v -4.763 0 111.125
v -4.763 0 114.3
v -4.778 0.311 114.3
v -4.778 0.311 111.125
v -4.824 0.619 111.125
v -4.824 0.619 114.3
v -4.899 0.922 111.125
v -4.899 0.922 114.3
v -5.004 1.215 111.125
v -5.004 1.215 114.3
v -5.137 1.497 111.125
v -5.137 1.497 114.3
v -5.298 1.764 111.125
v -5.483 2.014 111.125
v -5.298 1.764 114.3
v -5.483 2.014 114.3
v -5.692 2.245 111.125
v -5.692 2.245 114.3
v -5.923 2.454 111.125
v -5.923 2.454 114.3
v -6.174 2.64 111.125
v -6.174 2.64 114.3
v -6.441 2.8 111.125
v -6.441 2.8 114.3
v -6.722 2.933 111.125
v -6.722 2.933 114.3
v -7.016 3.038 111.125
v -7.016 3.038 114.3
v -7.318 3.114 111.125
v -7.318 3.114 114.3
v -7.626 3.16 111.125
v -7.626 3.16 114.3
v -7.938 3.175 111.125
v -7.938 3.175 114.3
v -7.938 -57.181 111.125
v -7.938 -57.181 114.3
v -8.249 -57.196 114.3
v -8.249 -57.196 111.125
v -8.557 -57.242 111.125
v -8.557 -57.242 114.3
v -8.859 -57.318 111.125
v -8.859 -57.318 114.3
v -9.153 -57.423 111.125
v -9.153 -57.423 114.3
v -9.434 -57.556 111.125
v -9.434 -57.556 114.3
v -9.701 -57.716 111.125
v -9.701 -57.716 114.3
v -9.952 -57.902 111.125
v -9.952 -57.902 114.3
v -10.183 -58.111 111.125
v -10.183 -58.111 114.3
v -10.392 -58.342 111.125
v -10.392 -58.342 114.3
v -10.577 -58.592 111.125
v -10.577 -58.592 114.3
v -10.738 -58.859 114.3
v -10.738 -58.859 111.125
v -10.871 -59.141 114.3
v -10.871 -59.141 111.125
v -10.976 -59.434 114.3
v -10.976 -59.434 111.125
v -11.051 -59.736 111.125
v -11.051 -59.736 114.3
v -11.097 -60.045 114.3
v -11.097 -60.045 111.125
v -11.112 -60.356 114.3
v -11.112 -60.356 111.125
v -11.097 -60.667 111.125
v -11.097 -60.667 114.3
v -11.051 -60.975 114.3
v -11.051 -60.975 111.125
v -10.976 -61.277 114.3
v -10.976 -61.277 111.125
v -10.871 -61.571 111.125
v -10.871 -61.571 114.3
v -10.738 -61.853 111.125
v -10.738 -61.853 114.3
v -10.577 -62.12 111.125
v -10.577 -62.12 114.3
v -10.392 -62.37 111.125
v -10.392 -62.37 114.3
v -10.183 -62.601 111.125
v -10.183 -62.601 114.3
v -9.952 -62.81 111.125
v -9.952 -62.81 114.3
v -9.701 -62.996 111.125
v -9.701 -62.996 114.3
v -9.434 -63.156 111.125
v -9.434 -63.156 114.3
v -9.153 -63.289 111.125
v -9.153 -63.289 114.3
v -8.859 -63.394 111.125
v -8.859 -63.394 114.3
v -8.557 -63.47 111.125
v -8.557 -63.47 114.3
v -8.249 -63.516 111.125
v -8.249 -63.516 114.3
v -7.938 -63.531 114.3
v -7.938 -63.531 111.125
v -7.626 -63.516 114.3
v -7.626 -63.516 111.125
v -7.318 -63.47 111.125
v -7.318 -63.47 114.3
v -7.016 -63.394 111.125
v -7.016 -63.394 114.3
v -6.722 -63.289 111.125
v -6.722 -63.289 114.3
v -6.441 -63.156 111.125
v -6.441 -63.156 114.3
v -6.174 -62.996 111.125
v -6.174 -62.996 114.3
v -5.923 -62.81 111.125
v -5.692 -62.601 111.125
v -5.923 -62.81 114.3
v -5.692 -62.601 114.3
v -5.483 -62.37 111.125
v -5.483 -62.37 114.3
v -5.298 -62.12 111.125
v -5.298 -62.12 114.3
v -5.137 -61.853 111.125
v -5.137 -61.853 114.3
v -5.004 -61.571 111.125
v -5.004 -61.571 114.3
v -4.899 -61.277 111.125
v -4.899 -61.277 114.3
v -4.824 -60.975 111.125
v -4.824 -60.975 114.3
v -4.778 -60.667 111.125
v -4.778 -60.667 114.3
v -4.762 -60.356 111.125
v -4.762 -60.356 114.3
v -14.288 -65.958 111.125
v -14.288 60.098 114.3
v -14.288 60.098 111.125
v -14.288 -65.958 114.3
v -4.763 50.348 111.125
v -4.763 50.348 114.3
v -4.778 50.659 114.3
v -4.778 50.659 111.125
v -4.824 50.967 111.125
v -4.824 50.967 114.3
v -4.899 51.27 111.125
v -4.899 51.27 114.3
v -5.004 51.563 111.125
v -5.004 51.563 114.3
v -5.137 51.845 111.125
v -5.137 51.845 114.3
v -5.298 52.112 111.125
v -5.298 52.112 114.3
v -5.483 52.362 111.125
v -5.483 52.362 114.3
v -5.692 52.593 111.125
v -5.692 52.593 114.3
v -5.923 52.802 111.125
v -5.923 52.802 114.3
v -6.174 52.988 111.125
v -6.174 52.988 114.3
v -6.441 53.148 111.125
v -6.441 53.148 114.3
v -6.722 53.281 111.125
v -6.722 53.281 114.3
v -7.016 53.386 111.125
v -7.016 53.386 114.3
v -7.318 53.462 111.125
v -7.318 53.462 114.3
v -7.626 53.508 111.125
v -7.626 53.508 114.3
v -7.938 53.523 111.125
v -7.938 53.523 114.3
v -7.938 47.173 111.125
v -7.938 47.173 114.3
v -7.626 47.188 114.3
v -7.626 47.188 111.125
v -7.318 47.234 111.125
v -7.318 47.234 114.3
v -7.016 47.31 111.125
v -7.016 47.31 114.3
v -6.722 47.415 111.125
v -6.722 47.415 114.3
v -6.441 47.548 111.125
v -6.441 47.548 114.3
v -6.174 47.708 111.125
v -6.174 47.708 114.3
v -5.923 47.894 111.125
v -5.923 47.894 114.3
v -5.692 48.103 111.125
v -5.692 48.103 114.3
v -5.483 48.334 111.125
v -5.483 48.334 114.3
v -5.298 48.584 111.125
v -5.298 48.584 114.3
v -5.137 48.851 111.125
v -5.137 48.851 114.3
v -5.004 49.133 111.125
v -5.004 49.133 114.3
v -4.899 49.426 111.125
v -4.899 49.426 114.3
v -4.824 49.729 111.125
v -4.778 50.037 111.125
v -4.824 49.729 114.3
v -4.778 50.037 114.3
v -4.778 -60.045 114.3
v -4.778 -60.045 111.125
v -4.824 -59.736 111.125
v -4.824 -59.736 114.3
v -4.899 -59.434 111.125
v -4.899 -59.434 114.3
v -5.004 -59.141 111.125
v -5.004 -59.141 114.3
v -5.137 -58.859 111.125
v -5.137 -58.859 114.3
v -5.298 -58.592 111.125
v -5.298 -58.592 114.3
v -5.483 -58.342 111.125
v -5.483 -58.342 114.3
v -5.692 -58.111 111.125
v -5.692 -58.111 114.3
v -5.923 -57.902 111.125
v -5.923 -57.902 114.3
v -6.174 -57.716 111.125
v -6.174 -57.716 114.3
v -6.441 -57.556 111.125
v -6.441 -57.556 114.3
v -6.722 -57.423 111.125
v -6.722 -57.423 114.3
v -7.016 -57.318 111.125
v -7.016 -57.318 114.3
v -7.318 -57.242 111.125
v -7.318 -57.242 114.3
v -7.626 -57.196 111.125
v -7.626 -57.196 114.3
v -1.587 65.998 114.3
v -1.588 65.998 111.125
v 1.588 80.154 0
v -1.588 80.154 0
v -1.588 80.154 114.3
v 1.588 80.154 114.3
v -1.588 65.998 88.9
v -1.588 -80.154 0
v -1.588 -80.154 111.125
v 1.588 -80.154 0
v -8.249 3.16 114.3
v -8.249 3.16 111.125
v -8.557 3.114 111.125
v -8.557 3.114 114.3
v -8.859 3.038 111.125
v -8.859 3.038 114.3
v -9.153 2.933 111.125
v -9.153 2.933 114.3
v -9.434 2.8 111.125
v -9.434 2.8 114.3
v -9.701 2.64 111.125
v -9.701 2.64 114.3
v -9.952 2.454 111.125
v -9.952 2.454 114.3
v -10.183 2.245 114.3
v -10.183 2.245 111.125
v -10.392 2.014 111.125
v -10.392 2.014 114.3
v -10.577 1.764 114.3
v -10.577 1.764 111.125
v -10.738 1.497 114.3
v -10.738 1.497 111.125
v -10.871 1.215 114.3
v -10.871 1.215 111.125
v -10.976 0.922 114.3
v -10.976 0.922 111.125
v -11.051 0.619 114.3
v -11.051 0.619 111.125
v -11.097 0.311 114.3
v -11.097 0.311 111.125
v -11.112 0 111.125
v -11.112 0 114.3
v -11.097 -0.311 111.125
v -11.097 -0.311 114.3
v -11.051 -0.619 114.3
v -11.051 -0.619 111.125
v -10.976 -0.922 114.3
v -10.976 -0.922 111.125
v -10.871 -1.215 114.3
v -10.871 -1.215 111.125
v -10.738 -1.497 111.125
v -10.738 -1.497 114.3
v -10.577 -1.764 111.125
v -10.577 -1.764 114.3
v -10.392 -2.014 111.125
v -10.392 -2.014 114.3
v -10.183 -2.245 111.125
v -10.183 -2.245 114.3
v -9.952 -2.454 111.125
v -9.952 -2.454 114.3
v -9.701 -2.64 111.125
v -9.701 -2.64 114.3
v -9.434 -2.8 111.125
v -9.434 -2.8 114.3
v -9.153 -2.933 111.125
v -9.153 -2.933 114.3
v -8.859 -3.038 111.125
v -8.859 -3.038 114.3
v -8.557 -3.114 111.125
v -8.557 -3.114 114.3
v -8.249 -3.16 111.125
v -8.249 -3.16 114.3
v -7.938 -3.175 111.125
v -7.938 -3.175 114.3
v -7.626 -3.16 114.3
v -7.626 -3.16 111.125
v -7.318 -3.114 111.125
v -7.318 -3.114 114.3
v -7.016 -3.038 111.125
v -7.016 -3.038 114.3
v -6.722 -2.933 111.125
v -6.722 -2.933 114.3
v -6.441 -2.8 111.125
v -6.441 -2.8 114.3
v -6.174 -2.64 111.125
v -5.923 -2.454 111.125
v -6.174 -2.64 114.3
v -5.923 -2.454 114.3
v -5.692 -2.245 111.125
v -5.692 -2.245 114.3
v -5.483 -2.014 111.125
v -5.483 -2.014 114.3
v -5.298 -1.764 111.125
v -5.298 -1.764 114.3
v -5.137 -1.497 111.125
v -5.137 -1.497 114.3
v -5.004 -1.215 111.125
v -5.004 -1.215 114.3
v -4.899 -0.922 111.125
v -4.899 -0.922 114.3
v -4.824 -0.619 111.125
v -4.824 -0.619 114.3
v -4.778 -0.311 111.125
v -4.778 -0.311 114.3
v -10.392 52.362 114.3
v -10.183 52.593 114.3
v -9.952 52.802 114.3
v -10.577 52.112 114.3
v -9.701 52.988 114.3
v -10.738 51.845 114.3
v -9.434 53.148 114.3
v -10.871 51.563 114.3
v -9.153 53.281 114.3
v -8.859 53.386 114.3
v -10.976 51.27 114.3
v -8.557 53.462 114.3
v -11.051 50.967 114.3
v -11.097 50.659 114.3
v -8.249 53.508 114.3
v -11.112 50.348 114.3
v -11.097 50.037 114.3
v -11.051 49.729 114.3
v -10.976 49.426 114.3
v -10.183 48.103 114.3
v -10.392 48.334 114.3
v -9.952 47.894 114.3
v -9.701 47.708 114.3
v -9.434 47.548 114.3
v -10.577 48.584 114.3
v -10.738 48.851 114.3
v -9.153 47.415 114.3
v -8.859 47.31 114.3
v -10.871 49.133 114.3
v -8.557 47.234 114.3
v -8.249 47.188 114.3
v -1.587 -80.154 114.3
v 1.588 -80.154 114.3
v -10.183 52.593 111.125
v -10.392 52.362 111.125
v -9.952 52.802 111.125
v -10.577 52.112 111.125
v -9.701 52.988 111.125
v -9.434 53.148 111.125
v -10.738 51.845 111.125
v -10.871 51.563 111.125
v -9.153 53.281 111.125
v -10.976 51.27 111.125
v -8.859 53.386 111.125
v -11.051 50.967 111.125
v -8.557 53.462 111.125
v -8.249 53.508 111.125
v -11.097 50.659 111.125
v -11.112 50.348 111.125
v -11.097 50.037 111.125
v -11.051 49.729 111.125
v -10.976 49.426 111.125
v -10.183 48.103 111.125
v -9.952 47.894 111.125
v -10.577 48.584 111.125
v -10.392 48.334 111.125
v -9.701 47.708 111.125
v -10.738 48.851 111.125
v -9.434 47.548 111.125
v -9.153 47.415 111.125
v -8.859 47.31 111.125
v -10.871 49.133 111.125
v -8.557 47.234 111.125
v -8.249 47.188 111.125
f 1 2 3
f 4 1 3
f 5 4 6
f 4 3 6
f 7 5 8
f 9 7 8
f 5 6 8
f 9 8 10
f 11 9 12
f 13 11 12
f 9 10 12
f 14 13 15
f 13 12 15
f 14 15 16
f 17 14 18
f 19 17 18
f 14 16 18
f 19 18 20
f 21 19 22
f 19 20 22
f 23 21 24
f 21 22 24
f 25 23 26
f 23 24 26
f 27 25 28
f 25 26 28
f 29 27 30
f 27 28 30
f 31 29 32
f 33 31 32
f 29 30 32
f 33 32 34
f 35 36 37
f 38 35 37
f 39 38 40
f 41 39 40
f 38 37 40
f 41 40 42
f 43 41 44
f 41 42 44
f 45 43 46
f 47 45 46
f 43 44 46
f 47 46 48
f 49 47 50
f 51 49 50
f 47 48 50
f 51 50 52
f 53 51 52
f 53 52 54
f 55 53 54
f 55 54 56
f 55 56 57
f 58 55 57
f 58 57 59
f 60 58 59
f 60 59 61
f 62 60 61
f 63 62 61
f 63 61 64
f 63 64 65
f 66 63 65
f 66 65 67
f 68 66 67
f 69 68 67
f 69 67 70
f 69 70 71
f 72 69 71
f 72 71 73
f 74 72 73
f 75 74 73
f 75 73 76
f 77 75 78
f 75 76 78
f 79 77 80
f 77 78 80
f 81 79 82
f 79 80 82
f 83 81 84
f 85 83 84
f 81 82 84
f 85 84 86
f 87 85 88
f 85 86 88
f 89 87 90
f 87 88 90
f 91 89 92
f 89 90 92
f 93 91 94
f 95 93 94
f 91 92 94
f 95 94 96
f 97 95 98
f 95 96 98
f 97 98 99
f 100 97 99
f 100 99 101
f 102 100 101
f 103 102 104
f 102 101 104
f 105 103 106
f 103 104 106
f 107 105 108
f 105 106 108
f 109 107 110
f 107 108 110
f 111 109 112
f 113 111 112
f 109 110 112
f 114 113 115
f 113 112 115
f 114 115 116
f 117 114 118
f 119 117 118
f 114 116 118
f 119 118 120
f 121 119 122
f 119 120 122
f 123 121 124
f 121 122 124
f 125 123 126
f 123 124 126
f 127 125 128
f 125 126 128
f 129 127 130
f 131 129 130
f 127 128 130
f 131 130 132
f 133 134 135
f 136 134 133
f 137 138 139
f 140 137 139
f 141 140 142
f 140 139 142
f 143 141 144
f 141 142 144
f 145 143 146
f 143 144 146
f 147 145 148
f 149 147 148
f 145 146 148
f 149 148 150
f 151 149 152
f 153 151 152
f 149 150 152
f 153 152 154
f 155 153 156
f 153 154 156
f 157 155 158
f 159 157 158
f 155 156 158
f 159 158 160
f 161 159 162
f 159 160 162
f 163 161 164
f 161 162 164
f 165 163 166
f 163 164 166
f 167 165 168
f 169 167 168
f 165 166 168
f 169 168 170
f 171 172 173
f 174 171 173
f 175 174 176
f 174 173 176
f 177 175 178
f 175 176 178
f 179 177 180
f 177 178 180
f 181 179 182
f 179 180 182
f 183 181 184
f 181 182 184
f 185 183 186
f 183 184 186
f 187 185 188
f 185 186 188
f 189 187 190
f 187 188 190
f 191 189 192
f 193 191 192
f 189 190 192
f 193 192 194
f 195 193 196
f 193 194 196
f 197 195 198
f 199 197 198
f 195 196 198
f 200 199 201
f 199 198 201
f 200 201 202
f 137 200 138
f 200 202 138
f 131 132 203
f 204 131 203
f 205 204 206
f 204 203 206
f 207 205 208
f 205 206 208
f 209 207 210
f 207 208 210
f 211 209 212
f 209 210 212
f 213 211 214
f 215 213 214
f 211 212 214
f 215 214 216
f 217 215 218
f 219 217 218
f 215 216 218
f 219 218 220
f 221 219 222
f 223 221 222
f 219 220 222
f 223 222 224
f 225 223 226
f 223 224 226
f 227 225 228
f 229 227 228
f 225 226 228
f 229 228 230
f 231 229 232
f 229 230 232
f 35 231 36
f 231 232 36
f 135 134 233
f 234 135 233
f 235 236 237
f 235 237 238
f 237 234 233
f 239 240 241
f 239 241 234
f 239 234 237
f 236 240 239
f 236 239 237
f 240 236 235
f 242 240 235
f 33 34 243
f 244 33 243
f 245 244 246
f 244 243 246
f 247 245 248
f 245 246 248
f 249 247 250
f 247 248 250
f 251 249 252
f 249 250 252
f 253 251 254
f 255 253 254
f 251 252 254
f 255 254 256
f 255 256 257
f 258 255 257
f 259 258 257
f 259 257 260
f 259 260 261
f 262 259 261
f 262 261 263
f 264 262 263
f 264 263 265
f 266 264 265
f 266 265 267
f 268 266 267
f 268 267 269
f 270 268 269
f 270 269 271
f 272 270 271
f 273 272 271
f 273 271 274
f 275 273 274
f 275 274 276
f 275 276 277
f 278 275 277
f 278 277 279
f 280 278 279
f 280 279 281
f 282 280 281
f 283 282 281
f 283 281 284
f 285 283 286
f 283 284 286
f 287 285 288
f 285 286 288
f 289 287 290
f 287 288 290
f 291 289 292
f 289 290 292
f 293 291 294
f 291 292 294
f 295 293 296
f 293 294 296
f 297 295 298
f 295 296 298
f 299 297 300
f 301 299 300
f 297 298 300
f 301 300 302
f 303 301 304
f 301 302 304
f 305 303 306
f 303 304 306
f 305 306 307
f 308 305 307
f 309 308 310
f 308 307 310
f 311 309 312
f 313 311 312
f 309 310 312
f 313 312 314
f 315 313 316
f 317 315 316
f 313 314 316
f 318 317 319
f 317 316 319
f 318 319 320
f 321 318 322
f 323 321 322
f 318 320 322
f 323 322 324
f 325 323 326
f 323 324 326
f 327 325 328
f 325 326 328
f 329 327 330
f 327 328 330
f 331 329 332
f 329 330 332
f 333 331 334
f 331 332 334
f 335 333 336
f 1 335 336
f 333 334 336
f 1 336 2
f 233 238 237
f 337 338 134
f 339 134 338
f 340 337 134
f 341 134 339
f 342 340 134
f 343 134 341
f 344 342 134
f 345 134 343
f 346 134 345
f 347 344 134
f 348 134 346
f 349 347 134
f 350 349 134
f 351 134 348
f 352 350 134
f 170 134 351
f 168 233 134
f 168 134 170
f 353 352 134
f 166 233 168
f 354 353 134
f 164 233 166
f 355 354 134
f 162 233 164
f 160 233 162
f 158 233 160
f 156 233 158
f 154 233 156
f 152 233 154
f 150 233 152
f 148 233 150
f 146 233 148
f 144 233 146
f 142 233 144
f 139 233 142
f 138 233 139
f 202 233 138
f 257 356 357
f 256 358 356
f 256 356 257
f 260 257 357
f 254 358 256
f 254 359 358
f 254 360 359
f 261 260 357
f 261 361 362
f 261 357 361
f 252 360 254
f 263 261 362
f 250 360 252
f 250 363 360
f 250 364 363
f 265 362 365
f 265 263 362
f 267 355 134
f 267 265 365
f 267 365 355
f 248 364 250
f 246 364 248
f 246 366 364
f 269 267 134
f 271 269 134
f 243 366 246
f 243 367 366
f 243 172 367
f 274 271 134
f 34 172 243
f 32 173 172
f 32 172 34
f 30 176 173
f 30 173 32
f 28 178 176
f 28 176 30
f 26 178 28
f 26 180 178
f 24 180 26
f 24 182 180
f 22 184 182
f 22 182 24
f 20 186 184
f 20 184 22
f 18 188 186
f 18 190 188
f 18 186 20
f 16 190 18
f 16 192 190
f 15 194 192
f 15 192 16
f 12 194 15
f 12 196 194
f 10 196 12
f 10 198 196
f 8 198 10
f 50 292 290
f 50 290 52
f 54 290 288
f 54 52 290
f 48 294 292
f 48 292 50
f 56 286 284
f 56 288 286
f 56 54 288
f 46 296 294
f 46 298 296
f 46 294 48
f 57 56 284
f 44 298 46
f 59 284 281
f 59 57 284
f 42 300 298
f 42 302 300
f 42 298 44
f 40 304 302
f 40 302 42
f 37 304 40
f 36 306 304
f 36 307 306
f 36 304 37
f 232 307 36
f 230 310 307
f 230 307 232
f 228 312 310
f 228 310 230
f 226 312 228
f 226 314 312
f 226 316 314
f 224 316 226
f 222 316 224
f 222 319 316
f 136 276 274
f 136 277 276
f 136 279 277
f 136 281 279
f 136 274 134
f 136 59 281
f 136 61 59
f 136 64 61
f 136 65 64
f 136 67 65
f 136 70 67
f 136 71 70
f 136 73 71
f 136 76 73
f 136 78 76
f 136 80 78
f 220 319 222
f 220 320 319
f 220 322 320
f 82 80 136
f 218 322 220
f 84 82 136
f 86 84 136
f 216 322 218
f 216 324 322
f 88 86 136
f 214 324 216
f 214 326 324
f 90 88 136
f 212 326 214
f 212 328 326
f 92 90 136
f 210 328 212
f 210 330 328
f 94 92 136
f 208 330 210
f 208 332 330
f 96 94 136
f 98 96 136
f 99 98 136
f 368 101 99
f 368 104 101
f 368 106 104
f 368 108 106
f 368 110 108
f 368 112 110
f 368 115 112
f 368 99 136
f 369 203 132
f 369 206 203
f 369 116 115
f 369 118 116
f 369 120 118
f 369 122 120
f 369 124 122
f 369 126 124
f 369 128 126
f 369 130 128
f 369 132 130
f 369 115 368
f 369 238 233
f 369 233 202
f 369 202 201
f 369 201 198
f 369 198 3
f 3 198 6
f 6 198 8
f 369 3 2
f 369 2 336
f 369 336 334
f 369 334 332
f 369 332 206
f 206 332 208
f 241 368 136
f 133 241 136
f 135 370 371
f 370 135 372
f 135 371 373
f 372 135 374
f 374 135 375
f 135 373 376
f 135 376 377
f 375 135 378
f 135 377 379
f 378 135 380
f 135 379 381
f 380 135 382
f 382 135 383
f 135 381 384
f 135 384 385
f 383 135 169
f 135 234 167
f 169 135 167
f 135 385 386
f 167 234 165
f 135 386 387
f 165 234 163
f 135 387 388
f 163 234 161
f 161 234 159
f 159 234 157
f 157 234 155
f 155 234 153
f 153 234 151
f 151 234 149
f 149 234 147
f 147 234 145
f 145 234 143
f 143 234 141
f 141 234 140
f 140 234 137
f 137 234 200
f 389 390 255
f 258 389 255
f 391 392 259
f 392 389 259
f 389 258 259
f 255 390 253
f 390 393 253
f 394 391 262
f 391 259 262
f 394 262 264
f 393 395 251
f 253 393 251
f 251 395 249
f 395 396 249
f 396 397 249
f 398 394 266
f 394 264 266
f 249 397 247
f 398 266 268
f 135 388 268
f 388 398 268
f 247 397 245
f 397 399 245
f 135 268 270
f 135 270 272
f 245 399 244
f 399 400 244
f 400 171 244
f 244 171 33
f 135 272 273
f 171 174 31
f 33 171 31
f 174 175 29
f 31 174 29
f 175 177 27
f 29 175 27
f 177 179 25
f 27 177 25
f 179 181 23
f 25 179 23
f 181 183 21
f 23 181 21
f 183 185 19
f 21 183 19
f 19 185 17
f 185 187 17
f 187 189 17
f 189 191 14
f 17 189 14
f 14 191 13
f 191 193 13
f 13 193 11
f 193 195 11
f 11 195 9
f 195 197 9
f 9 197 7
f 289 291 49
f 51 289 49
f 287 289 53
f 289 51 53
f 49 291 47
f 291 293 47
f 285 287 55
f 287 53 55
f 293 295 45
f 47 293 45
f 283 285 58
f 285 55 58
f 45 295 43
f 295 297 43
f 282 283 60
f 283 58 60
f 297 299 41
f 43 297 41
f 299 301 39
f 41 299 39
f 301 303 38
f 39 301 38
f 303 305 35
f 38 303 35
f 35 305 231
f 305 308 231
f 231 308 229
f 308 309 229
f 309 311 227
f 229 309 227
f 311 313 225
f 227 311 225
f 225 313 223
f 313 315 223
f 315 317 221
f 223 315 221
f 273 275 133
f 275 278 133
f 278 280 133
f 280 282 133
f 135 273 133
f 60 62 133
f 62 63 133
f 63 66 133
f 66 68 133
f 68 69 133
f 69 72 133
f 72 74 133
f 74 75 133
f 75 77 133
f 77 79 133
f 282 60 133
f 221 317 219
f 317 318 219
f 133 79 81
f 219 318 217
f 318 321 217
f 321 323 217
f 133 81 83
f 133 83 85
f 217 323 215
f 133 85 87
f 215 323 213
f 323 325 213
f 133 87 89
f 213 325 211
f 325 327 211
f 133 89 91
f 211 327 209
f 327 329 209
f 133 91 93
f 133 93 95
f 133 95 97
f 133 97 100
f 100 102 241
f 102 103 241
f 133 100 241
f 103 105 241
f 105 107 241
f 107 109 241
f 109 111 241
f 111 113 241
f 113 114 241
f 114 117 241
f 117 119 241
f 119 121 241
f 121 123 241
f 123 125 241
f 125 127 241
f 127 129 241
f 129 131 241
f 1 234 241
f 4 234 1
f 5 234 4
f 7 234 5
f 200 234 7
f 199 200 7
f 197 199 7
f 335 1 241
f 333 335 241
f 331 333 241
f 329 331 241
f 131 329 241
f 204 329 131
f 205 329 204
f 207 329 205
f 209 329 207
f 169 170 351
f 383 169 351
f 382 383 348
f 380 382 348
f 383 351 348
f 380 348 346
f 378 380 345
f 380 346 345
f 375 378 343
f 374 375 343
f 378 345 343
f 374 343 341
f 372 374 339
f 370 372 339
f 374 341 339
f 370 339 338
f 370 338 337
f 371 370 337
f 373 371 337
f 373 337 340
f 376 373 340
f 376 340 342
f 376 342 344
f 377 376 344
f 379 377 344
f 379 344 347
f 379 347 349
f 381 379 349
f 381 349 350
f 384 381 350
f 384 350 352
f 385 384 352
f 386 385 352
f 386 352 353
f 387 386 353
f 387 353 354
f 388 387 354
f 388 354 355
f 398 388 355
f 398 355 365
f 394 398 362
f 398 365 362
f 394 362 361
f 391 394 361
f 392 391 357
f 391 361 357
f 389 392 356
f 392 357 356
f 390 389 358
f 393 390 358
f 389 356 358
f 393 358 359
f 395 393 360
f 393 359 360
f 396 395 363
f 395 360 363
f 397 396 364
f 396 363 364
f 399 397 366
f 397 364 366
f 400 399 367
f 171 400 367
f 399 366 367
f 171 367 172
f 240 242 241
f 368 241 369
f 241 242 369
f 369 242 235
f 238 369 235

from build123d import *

# Parameters (mm, degrees)
F0_W     = 3.175
F0_H     = 160.30702
F1_DEPTH = 114.3
F2_W     = 146.1514011281
F2_H     = 3.175
F3_DEPTH = 12.7
F5_DEPTH = 25.4
F7_DEPTH = 25.4


with BuildPart() as f1:
    # F0 (on Top) → F1 (new body)
    with BuildSketch(Plane.XY):
        Rectangle(F0_W, F0_H)
    extrude(amount=F1_DEPTH)

    # F2 (on face) → F3 (join)
    with BuildSketch(Plane(origin=(-1.5875, 0, 0), x_dir=(0, -1, 0), z_dir=(-1, 0, 0))):
        with Locations((7.077809436, 112.7125)):
            Rectangle(F2_W, F2_H)
    extrude(amount=F3_DEPTH)

    # F4 (on face) → F5 (cut)
    with BuildSketch(Plane.XY.offset(114.3)):
        Polygon((-14.2875, 60.0979924202), (-1.5875, 65.9978911281), (-14.2875, 65.9978911281), align=None)
        Polygon((-14.2875, -80.15351), (-1.5875, -80.15351), (-14.2875, -65.9581273794), align=None)
    extrude(amount=-F5_DEPTH, mode=Mode.SUBTRACT)

    # F6 (on face) → F7 (cut)
    with BuildSketch(Plane.XY.offset(114.3)):
        with BuildLine():
            ThreePointArc((-4.7625, 50.3479417741), (-5.6924359697, 52.5930058044), (-7.9375, 53.5229417741))
            Line((-7.9375, 53.5229417741), (-7.9375, 47.1729417741))
            ThreePointArc((-7.9375, 47.1729417741), (-5.6924359697, 48.1028777439), (-4.7625, 50.3479417741))
        make_face()
        with BuildLine():
            ThreePointArc((-4.7625, -60.3558186897), (-5.6924359697, -58.1107546594), (-7.9375, -57.1808186897))
            Line((-7.9375, -57.1808186897), (-7.9375, -63.5308186897))
            ThreePointArc((-7.9375, -63.5308186897), (-5.6924359697, -62.60088272), (-4.7625, -60.3558186897))
        make_face()
        with BuildLine():
            Line((-7.9375, -63.5308186897), (-7.9375, -57.1808186897))
            ThreePointArc((-7.9375, -57.1808186897), (-11.1125, -60.3558186897), (-7.9375, -63.5308186897))
        make_face()
        with BuildLine():
            ThreePointArc((-4.7625, 0), (-5.6924359697, 2.2450640303), (-7.9375, 3.175))
            Line((-7.9375, 3.175), (-7.9375, -3.175))
            ThreePointArc((-7.9375, -3.175), (-5.6924359697, -2.2450640303), (-4.7625, 0))
        make_face()
        with BuildLine():
            Line((-7.9375, -3.175), (-7.9375, 3.175))
            ThreePointArc((-7.9375, 3.175), (-11.1125, 0), (-7.9375, -3.175))
        make_face()
        with BuildLine():
            Line((-7.9375, 47.1729417741), (-7.9375, 53.5229417741))
            ThreePointArc((-7.9375, 53.5229417741), (-11.1125, 50.3479417741), (-7.9375, 47.1729417741))
        make_face()
    extrude(amount=-F7_DEPTH, mode=Mode.SUBTRACT)


solid = f1.part
